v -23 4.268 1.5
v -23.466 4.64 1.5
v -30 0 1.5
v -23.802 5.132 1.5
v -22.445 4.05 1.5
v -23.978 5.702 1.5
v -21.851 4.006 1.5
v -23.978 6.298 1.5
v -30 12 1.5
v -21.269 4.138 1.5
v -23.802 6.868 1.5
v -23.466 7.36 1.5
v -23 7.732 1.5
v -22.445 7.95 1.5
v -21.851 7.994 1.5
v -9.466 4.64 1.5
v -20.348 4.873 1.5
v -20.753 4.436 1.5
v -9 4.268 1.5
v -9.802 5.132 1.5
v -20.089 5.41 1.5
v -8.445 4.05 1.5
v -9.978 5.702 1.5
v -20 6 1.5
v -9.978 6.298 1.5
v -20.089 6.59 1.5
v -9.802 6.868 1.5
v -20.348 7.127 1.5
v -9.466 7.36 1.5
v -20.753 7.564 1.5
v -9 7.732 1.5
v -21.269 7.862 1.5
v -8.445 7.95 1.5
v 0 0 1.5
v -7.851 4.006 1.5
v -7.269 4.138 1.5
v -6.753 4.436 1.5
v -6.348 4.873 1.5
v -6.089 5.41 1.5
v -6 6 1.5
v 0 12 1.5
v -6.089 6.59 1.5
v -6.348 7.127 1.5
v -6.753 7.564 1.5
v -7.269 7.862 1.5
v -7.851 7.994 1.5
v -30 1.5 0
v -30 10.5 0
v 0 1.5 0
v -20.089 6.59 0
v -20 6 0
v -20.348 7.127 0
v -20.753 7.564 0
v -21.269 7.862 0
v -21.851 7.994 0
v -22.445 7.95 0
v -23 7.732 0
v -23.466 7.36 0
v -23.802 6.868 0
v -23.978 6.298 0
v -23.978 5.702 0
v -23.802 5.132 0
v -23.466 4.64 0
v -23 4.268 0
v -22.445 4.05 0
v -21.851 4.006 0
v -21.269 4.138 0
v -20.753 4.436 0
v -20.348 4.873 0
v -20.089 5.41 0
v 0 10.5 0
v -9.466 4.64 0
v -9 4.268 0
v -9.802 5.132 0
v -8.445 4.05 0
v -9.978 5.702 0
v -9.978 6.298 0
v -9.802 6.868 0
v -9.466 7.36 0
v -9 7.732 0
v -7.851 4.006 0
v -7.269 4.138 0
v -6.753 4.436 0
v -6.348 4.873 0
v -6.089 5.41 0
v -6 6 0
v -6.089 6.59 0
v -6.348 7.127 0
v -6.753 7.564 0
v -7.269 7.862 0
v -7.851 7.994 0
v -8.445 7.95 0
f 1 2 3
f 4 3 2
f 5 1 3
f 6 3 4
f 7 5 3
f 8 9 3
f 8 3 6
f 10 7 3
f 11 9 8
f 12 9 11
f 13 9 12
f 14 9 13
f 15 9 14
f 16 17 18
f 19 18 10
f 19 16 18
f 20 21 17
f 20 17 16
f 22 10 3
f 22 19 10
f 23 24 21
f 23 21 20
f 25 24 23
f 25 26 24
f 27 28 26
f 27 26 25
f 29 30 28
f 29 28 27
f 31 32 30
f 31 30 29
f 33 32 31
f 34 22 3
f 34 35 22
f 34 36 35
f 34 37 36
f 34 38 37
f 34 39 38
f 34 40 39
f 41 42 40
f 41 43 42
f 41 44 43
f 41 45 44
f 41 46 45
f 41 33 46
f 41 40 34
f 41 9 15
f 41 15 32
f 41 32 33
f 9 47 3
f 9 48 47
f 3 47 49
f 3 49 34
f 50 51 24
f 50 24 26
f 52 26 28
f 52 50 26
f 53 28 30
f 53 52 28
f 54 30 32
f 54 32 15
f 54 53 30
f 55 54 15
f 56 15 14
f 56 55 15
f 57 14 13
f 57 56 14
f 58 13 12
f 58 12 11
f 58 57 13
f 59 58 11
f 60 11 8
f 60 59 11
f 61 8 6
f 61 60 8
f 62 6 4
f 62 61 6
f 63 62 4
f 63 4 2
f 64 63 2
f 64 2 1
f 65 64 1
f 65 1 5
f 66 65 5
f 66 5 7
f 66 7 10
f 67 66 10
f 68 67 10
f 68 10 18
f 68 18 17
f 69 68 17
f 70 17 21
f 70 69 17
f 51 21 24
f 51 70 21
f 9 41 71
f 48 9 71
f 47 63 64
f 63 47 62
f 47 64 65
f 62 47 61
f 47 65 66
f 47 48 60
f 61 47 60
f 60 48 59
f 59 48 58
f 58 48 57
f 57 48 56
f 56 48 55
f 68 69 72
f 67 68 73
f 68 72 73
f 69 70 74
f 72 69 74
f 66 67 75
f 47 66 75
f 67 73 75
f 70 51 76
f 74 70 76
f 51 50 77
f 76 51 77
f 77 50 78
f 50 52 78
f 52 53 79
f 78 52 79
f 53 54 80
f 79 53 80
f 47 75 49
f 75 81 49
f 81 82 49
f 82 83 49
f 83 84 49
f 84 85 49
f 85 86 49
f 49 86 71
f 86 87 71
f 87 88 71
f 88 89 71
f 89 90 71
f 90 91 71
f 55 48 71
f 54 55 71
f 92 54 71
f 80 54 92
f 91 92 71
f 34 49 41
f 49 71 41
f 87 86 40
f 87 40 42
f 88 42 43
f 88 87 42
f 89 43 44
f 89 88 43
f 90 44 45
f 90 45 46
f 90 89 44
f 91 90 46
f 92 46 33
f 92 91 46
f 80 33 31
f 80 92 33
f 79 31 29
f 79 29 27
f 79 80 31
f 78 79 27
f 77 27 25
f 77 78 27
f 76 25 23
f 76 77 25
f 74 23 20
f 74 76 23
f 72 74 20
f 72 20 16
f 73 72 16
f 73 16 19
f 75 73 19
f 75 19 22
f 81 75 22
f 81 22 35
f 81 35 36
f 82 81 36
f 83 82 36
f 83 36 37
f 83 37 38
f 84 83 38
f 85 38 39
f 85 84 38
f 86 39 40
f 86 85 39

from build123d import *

# Parameters (mm, degrees)
SKETCH1_W           = 30
SKETCH1_H           = 12
SKETCH1_R           = 2
BOSS_EXTRUDE1_DEPTH = 1.5
CUT_EXTRUDE1_DEPTH  = 31


with BuildPart() as part:
    # Sketch1 → Boss-Extrude1 (new body)
    with BuildSketch(Plane.XY):
        with Locations((-15, 6)):
            Rectangle(SKETCH1_W, SKETCH1_H)
        with Locations((-22, 6)):
            Circle(SKETCH1_R, mode=Mode.SUBTRACT)
        with Locations((-8, 6)):
            Circle(SKETCH1_R, mode=Mode.SUBTRACT)
    extrude(amount=BOSS_EXTRUDE1_DEPTH)

    # Sketch2 → Cut-Extrude1 (cut, through all)
    with BuildSketch(Plane(origin=(0, 0, 0), x_dir=(0, 0, -1), z_dir=(1, 0, 0))):
        Polygon((0, 12), (-1.5, 12), (0, 10.5), align=None)
        Polygon((0, 0), (0, 1.5), (-1.5, 0), align=None)
    extrude(amount=-CUT_EXTRUDE1_DEPTH, mode=Mode.SUBTRACT)


solid = part.part
